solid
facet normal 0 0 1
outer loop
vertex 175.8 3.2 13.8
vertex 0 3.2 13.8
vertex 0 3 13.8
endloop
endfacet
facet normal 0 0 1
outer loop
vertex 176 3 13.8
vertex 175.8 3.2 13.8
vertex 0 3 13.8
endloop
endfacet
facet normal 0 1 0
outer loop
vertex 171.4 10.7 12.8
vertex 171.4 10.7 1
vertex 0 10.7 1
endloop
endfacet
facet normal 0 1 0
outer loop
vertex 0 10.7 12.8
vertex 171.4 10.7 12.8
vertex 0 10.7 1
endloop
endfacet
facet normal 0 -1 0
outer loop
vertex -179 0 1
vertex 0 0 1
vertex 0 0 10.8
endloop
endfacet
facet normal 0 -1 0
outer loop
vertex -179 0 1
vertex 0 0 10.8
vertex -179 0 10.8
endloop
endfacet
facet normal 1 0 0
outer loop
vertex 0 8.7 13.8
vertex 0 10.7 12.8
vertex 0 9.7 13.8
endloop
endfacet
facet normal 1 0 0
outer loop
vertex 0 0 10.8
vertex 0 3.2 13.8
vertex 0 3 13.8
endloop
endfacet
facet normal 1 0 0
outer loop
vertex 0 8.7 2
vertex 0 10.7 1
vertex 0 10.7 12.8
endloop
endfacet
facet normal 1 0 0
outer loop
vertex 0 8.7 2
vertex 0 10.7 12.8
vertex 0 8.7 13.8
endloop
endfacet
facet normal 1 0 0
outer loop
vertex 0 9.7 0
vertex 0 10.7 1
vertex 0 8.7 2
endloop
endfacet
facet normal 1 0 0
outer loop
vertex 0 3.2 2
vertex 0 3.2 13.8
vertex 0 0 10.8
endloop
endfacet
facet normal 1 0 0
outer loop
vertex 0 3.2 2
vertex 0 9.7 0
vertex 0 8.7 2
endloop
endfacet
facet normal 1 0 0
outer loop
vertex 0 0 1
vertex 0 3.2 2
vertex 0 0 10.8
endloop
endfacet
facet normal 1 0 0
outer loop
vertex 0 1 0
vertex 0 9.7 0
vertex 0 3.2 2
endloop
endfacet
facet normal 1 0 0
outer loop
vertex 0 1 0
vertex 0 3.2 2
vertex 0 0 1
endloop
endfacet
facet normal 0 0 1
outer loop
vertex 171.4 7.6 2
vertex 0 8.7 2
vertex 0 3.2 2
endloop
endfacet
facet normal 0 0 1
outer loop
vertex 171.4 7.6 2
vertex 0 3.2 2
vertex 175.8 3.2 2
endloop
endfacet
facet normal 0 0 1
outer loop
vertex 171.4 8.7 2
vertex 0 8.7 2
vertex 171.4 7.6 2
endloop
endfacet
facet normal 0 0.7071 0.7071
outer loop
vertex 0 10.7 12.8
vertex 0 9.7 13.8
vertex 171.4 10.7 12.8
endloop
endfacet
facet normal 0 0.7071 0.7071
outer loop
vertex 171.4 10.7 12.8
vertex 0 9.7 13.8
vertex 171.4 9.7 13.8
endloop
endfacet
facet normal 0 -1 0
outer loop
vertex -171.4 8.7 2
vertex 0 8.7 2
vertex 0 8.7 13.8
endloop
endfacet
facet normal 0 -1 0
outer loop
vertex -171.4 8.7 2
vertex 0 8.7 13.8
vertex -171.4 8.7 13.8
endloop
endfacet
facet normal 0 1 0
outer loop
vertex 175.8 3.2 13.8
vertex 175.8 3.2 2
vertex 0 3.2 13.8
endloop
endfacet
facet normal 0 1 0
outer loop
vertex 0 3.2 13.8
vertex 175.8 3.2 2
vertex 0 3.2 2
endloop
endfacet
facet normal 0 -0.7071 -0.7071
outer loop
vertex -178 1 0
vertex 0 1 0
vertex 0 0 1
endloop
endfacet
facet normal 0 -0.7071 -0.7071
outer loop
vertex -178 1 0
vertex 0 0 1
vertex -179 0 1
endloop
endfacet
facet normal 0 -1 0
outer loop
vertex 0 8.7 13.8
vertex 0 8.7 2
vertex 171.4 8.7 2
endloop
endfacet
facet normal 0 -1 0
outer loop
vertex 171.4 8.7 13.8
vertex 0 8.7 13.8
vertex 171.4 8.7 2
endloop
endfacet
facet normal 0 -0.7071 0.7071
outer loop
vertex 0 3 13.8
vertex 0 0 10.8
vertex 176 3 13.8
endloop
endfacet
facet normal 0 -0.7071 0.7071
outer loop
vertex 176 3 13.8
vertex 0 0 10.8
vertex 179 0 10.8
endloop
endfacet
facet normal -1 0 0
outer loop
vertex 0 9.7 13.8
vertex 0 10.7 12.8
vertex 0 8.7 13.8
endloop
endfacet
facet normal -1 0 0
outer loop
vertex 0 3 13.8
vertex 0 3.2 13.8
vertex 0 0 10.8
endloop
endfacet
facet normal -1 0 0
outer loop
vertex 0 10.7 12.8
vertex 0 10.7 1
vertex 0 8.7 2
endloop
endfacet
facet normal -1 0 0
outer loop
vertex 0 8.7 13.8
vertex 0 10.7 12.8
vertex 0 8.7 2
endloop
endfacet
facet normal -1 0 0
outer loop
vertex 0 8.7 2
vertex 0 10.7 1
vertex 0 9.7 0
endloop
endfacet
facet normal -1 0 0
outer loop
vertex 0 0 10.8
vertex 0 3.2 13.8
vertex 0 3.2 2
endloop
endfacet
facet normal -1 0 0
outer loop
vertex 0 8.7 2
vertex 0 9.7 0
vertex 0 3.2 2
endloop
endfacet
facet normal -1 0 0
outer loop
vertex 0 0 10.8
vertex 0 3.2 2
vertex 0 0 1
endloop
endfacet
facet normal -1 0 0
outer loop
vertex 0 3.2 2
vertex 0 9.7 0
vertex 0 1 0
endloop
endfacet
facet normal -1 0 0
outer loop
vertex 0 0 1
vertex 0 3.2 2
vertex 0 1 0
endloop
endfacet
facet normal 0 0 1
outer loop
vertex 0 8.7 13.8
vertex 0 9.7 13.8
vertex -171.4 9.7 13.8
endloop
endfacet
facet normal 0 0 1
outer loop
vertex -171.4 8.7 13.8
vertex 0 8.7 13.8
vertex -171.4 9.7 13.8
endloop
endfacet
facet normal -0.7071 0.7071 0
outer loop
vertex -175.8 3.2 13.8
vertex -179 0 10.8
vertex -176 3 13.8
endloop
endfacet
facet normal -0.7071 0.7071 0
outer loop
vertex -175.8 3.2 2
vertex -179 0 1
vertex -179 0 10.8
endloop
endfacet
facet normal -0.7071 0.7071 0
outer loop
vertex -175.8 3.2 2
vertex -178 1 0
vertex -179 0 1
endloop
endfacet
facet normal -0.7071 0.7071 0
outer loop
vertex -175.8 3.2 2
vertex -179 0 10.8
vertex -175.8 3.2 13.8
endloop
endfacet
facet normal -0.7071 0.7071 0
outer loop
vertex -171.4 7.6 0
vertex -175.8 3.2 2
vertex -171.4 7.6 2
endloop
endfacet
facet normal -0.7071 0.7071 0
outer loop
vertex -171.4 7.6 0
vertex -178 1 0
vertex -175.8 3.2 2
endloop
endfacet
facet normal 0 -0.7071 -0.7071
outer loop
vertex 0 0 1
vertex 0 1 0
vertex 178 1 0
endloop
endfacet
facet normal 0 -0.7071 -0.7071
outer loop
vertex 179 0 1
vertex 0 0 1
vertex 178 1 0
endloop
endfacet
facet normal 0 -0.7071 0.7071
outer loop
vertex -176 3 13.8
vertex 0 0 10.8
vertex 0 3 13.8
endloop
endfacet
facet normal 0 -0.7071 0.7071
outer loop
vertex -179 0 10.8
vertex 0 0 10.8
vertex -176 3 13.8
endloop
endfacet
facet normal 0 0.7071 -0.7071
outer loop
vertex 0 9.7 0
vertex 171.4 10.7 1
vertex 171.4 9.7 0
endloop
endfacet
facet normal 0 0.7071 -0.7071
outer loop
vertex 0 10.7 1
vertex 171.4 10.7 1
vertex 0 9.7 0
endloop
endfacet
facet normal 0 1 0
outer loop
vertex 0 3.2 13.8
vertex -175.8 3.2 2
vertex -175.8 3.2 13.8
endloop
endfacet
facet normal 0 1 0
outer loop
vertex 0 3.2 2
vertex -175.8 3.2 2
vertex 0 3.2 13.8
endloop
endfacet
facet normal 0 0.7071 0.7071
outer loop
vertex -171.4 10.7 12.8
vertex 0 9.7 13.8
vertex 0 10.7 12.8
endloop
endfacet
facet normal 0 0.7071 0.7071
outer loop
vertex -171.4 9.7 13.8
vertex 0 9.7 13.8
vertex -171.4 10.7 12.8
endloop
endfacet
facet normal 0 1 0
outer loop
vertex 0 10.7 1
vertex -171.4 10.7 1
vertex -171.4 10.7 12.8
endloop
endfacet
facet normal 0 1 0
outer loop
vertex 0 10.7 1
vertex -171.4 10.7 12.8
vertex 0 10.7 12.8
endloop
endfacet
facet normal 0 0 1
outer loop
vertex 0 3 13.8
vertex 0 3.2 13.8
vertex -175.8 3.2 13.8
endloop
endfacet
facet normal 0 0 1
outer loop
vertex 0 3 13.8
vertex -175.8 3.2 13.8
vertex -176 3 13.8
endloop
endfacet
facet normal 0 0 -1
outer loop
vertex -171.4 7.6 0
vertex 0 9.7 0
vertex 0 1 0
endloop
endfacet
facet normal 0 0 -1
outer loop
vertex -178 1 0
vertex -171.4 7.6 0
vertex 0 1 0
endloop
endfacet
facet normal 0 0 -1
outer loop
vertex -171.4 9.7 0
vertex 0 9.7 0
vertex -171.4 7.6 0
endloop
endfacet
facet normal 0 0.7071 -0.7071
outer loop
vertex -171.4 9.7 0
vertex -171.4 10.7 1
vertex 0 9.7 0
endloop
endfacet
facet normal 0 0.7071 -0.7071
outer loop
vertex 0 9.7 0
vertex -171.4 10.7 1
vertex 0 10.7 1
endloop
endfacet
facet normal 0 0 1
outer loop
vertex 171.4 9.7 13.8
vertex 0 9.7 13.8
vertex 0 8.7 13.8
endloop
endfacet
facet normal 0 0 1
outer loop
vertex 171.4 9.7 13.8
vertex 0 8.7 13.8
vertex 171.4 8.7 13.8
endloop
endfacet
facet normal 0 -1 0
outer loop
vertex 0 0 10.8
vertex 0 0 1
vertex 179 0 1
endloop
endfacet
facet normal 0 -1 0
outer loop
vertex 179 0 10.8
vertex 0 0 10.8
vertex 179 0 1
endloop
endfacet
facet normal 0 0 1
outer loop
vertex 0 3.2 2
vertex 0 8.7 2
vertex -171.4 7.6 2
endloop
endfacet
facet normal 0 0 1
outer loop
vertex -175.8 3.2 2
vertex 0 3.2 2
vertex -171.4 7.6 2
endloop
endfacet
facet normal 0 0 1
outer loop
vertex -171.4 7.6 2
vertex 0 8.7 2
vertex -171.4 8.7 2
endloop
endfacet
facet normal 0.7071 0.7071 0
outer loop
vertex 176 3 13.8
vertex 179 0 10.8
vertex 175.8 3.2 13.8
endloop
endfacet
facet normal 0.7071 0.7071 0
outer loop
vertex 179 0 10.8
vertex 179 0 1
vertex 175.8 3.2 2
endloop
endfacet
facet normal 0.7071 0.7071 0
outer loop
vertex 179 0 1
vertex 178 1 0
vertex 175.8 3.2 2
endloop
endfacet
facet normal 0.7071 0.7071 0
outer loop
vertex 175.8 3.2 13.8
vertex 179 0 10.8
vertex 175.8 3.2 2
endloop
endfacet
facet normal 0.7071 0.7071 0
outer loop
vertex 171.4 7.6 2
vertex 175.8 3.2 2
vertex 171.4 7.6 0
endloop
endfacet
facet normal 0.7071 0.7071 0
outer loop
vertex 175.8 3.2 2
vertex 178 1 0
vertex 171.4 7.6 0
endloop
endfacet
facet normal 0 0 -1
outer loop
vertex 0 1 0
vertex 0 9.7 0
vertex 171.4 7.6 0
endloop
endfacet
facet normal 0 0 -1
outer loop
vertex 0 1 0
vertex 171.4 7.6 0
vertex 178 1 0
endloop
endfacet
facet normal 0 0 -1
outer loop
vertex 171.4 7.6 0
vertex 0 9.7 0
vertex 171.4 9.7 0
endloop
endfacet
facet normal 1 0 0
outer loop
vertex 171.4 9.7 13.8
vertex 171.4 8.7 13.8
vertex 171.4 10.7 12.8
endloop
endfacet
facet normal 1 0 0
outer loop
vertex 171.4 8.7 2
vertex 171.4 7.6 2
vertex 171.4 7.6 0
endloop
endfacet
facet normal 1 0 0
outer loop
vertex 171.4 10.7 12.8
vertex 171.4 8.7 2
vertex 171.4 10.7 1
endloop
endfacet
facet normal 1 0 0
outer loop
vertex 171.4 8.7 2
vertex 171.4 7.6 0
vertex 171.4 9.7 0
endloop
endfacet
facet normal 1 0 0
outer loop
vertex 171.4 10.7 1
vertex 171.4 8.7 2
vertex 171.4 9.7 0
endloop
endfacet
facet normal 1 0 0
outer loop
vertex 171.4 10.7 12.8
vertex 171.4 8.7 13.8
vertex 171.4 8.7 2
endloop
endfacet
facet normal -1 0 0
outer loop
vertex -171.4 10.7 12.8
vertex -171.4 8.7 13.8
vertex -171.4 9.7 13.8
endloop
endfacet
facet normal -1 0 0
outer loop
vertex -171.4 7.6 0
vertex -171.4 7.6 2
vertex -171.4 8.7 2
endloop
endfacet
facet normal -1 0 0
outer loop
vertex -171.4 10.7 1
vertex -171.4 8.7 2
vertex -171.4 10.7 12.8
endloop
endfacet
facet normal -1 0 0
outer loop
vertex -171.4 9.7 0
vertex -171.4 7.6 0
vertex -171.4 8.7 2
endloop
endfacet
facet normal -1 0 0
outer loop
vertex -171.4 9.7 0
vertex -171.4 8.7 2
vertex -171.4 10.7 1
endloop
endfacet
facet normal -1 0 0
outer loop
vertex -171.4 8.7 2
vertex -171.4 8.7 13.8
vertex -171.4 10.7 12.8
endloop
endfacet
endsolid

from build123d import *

# Parameters (mm, degrees)
F1_DEPTH = 2
F2_W     = 171.4
F2_H     = 2
F3_DEPTH = 11.8
F4_SIZE  = 3
F5_SIZE  = 1


with BuildPart() as f1:
    # F0 (on Top) → F1 (new body)
    with BuildSketch(Plane.XY):
        Polygon((0, 10.7), (0, 0), (179, 0), (171.4, 7.6), (171.4, 10.7), align=None)
    extrude(amount=F1_DEPTH)

    # F2 (on face) → F3 (join)
    with BuildSketch(Plane.XY.offset(2)):
        Polygon((175.8, 3.2), (0, 3.2), (0, 0), (179, 0), align=None)
        with Locations((85.7, 9.7)):
            Rectangle(F2_W, F2_H)
    extrude(amount=F3_DEPTH)

    # F4
    f4_edges = [f1.edges().sort_by_distance(p)[0] for p in [
        (89.5, 0, 13.8),
    ]]
    chamfer(f4_edges, length=F4_SIZE)

    # F5
    f5_edges = [f1.edges().sort_by_distance(p)[0] for p in [
        (89.5, 0, 0),
        (85.7, 10.7, 0),
        (85.7, 10.7, 13.8),
    ]]
    chamfer(f5_edges, length=F5_SIZE)


with BuildPart() as f6_1:
    # F6: instance of F1
    add(f1.part.mirror(Plane.YZ))


solid = Compound([f1.part, f6_1.part])
